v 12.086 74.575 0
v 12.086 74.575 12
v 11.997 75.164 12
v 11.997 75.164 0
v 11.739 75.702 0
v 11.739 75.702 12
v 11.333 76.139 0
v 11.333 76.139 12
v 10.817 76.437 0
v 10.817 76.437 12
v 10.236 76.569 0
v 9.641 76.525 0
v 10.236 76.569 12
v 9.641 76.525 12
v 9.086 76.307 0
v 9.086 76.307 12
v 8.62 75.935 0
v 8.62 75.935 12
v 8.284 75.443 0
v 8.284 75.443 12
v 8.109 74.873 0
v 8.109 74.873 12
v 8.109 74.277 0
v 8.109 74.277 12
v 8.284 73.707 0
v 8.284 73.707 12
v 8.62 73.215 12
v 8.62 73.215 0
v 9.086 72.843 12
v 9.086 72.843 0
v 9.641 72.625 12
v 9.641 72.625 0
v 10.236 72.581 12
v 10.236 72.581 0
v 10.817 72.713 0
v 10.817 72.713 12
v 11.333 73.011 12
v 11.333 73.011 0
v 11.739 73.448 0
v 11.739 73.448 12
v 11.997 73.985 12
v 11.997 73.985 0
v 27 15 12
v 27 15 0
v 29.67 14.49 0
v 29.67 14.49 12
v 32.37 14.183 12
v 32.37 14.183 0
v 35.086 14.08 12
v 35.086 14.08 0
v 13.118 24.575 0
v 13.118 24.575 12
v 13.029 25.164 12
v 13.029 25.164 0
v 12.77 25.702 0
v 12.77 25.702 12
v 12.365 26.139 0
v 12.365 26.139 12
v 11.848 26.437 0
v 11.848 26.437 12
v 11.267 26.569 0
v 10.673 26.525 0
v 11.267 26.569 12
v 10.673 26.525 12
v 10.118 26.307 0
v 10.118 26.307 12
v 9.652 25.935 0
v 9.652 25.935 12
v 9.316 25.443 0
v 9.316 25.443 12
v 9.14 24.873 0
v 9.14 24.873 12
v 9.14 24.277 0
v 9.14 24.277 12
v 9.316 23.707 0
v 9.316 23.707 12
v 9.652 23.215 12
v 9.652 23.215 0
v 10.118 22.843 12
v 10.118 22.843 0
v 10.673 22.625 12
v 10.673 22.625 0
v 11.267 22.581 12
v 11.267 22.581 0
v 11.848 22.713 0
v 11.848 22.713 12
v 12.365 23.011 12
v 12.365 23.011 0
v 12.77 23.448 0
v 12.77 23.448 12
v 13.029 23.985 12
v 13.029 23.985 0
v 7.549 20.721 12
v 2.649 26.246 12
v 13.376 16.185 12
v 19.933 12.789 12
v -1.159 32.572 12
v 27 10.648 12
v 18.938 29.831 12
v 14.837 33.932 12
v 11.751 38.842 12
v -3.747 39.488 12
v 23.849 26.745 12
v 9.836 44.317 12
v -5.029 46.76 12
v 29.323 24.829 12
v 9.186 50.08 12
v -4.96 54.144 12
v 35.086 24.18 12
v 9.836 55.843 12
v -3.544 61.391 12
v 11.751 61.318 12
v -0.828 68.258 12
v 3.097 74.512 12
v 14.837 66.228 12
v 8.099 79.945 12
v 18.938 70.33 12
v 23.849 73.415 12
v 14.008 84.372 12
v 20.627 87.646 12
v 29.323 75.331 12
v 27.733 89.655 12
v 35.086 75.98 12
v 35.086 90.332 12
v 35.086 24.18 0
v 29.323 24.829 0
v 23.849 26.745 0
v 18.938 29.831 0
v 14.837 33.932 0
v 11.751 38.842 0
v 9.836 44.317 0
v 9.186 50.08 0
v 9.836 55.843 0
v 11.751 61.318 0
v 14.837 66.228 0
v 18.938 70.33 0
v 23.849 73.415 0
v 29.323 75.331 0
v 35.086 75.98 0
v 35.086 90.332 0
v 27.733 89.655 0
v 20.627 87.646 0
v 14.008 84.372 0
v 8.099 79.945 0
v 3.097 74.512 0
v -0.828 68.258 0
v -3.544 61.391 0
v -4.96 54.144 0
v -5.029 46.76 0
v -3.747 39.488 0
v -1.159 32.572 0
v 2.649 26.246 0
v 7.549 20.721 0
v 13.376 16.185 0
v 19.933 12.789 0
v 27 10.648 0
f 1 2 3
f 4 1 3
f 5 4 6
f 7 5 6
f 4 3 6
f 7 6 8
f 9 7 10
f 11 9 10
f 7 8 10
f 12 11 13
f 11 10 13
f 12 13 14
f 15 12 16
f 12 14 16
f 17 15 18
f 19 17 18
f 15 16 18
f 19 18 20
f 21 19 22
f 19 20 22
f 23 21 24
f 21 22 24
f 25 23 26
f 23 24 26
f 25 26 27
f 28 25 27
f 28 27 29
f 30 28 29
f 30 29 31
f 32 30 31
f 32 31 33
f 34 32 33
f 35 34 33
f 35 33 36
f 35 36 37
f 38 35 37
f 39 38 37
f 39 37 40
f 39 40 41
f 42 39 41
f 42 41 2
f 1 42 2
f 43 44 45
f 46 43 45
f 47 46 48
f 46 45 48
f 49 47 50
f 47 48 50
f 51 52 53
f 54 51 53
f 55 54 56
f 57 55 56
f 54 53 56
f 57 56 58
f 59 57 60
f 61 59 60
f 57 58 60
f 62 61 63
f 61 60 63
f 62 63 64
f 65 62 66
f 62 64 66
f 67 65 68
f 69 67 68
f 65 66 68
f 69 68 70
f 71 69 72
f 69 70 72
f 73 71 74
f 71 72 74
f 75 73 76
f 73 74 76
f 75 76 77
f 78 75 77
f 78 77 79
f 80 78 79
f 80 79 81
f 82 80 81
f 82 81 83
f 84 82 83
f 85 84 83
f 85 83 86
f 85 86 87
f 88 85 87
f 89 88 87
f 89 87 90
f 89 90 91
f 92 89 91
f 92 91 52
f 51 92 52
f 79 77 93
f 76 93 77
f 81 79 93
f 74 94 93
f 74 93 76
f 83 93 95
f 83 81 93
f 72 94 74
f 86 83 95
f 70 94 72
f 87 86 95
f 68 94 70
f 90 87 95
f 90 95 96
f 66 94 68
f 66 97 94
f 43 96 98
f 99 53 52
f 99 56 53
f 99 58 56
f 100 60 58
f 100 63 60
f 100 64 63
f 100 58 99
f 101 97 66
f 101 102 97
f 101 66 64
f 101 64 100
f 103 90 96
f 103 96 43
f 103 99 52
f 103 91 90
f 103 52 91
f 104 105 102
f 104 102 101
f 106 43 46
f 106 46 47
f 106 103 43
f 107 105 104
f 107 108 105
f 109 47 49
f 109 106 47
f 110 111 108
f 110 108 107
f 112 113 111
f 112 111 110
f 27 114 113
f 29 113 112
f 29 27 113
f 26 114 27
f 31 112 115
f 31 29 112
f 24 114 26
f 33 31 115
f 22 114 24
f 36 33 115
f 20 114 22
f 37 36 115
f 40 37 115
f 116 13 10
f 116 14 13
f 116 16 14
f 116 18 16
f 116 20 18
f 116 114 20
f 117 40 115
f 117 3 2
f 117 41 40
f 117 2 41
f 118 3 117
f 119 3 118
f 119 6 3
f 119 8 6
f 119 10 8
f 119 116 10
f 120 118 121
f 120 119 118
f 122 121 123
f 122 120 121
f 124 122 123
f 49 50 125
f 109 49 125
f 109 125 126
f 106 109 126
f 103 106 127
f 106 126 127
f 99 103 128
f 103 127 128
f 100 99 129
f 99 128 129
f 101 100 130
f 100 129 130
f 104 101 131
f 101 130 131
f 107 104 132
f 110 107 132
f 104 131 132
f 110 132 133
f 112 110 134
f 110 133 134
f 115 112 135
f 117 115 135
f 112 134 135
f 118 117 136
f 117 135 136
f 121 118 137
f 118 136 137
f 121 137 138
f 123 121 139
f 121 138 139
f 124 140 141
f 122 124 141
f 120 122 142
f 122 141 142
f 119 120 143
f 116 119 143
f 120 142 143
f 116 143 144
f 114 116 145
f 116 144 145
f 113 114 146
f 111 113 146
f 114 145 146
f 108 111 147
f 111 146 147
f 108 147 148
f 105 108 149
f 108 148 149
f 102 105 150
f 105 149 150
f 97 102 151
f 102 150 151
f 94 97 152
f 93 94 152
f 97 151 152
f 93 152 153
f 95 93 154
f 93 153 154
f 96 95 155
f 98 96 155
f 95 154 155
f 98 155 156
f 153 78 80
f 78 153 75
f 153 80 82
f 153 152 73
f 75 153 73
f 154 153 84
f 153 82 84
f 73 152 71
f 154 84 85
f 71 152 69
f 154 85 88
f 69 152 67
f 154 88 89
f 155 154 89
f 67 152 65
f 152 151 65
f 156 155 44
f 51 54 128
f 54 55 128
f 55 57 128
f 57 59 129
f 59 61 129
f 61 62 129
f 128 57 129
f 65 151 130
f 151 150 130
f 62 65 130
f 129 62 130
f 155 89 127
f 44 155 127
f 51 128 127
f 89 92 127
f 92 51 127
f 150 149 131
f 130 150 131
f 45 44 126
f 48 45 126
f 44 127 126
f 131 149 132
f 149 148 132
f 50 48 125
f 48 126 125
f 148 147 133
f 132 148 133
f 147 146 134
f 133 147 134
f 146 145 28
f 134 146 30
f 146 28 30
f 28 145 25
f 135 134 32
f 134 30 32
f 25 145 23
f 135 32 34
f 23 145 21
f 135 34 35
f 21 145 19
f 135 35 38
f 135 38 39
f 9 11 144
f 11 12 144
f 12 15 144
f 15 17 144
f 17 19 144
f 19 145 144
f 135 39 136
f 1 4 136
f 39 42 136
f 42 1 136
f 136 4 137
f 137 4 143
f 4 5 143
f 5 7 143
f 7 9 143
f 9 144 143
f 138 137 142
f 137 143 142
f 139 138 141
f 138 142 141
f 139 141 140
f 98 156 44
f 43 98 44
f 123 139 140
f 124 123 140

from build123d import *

# Parameters (mm, degrees)
BOSS_EXTRUDE1_DEPTH = 12
SKETCH2_R           = 2
CUT_EXTRUDE1_DEPTH  = 20


with BuildPart() as part:
    # Sketch1 → Boss-Extrude1 (new body)
    with BuildSketch(Plane.XY):
        with BuildLine():
            Line((27, 10.648423286), (27, 15))
            ThreePointArc((27, 15), (31.017062028, 14.31079961), (35.086282243, 14.08008038))
            Line((35.086282243, 14.08008038), (35.086282243, 24.18008038))
            ThreePointArc((35.086282243, 24.18008038), (9.186282243, 50.08008038), (35.086282243, 75.98008038))
            Line((35.086282243, 75.98008038), (35.086282243, 90.332329282))
            ThreePointArc((35.086282243, 90.332329282), (-4.960293251, 54.143986489), (27, 10.648423286))
        make_face()
    extrude(amount=BOSS_EXTRUDE1_DEPTH)

    # Sketch2 → Cut-Extrude1 (cut)
    with BuildSketch(Plane.XY.offset(12)):
        with Locations((10.086282243, 74.574977808)):
            Circle(SKETCH2_R)
        with Locations((11.117766586, 24.574977808)):
            Circle(SKETCH2_R)
    extrude(amount=-CUT_EXTRUDE1_DEPTH, mode=Mode.SUBTRACT)


solid = part.part
